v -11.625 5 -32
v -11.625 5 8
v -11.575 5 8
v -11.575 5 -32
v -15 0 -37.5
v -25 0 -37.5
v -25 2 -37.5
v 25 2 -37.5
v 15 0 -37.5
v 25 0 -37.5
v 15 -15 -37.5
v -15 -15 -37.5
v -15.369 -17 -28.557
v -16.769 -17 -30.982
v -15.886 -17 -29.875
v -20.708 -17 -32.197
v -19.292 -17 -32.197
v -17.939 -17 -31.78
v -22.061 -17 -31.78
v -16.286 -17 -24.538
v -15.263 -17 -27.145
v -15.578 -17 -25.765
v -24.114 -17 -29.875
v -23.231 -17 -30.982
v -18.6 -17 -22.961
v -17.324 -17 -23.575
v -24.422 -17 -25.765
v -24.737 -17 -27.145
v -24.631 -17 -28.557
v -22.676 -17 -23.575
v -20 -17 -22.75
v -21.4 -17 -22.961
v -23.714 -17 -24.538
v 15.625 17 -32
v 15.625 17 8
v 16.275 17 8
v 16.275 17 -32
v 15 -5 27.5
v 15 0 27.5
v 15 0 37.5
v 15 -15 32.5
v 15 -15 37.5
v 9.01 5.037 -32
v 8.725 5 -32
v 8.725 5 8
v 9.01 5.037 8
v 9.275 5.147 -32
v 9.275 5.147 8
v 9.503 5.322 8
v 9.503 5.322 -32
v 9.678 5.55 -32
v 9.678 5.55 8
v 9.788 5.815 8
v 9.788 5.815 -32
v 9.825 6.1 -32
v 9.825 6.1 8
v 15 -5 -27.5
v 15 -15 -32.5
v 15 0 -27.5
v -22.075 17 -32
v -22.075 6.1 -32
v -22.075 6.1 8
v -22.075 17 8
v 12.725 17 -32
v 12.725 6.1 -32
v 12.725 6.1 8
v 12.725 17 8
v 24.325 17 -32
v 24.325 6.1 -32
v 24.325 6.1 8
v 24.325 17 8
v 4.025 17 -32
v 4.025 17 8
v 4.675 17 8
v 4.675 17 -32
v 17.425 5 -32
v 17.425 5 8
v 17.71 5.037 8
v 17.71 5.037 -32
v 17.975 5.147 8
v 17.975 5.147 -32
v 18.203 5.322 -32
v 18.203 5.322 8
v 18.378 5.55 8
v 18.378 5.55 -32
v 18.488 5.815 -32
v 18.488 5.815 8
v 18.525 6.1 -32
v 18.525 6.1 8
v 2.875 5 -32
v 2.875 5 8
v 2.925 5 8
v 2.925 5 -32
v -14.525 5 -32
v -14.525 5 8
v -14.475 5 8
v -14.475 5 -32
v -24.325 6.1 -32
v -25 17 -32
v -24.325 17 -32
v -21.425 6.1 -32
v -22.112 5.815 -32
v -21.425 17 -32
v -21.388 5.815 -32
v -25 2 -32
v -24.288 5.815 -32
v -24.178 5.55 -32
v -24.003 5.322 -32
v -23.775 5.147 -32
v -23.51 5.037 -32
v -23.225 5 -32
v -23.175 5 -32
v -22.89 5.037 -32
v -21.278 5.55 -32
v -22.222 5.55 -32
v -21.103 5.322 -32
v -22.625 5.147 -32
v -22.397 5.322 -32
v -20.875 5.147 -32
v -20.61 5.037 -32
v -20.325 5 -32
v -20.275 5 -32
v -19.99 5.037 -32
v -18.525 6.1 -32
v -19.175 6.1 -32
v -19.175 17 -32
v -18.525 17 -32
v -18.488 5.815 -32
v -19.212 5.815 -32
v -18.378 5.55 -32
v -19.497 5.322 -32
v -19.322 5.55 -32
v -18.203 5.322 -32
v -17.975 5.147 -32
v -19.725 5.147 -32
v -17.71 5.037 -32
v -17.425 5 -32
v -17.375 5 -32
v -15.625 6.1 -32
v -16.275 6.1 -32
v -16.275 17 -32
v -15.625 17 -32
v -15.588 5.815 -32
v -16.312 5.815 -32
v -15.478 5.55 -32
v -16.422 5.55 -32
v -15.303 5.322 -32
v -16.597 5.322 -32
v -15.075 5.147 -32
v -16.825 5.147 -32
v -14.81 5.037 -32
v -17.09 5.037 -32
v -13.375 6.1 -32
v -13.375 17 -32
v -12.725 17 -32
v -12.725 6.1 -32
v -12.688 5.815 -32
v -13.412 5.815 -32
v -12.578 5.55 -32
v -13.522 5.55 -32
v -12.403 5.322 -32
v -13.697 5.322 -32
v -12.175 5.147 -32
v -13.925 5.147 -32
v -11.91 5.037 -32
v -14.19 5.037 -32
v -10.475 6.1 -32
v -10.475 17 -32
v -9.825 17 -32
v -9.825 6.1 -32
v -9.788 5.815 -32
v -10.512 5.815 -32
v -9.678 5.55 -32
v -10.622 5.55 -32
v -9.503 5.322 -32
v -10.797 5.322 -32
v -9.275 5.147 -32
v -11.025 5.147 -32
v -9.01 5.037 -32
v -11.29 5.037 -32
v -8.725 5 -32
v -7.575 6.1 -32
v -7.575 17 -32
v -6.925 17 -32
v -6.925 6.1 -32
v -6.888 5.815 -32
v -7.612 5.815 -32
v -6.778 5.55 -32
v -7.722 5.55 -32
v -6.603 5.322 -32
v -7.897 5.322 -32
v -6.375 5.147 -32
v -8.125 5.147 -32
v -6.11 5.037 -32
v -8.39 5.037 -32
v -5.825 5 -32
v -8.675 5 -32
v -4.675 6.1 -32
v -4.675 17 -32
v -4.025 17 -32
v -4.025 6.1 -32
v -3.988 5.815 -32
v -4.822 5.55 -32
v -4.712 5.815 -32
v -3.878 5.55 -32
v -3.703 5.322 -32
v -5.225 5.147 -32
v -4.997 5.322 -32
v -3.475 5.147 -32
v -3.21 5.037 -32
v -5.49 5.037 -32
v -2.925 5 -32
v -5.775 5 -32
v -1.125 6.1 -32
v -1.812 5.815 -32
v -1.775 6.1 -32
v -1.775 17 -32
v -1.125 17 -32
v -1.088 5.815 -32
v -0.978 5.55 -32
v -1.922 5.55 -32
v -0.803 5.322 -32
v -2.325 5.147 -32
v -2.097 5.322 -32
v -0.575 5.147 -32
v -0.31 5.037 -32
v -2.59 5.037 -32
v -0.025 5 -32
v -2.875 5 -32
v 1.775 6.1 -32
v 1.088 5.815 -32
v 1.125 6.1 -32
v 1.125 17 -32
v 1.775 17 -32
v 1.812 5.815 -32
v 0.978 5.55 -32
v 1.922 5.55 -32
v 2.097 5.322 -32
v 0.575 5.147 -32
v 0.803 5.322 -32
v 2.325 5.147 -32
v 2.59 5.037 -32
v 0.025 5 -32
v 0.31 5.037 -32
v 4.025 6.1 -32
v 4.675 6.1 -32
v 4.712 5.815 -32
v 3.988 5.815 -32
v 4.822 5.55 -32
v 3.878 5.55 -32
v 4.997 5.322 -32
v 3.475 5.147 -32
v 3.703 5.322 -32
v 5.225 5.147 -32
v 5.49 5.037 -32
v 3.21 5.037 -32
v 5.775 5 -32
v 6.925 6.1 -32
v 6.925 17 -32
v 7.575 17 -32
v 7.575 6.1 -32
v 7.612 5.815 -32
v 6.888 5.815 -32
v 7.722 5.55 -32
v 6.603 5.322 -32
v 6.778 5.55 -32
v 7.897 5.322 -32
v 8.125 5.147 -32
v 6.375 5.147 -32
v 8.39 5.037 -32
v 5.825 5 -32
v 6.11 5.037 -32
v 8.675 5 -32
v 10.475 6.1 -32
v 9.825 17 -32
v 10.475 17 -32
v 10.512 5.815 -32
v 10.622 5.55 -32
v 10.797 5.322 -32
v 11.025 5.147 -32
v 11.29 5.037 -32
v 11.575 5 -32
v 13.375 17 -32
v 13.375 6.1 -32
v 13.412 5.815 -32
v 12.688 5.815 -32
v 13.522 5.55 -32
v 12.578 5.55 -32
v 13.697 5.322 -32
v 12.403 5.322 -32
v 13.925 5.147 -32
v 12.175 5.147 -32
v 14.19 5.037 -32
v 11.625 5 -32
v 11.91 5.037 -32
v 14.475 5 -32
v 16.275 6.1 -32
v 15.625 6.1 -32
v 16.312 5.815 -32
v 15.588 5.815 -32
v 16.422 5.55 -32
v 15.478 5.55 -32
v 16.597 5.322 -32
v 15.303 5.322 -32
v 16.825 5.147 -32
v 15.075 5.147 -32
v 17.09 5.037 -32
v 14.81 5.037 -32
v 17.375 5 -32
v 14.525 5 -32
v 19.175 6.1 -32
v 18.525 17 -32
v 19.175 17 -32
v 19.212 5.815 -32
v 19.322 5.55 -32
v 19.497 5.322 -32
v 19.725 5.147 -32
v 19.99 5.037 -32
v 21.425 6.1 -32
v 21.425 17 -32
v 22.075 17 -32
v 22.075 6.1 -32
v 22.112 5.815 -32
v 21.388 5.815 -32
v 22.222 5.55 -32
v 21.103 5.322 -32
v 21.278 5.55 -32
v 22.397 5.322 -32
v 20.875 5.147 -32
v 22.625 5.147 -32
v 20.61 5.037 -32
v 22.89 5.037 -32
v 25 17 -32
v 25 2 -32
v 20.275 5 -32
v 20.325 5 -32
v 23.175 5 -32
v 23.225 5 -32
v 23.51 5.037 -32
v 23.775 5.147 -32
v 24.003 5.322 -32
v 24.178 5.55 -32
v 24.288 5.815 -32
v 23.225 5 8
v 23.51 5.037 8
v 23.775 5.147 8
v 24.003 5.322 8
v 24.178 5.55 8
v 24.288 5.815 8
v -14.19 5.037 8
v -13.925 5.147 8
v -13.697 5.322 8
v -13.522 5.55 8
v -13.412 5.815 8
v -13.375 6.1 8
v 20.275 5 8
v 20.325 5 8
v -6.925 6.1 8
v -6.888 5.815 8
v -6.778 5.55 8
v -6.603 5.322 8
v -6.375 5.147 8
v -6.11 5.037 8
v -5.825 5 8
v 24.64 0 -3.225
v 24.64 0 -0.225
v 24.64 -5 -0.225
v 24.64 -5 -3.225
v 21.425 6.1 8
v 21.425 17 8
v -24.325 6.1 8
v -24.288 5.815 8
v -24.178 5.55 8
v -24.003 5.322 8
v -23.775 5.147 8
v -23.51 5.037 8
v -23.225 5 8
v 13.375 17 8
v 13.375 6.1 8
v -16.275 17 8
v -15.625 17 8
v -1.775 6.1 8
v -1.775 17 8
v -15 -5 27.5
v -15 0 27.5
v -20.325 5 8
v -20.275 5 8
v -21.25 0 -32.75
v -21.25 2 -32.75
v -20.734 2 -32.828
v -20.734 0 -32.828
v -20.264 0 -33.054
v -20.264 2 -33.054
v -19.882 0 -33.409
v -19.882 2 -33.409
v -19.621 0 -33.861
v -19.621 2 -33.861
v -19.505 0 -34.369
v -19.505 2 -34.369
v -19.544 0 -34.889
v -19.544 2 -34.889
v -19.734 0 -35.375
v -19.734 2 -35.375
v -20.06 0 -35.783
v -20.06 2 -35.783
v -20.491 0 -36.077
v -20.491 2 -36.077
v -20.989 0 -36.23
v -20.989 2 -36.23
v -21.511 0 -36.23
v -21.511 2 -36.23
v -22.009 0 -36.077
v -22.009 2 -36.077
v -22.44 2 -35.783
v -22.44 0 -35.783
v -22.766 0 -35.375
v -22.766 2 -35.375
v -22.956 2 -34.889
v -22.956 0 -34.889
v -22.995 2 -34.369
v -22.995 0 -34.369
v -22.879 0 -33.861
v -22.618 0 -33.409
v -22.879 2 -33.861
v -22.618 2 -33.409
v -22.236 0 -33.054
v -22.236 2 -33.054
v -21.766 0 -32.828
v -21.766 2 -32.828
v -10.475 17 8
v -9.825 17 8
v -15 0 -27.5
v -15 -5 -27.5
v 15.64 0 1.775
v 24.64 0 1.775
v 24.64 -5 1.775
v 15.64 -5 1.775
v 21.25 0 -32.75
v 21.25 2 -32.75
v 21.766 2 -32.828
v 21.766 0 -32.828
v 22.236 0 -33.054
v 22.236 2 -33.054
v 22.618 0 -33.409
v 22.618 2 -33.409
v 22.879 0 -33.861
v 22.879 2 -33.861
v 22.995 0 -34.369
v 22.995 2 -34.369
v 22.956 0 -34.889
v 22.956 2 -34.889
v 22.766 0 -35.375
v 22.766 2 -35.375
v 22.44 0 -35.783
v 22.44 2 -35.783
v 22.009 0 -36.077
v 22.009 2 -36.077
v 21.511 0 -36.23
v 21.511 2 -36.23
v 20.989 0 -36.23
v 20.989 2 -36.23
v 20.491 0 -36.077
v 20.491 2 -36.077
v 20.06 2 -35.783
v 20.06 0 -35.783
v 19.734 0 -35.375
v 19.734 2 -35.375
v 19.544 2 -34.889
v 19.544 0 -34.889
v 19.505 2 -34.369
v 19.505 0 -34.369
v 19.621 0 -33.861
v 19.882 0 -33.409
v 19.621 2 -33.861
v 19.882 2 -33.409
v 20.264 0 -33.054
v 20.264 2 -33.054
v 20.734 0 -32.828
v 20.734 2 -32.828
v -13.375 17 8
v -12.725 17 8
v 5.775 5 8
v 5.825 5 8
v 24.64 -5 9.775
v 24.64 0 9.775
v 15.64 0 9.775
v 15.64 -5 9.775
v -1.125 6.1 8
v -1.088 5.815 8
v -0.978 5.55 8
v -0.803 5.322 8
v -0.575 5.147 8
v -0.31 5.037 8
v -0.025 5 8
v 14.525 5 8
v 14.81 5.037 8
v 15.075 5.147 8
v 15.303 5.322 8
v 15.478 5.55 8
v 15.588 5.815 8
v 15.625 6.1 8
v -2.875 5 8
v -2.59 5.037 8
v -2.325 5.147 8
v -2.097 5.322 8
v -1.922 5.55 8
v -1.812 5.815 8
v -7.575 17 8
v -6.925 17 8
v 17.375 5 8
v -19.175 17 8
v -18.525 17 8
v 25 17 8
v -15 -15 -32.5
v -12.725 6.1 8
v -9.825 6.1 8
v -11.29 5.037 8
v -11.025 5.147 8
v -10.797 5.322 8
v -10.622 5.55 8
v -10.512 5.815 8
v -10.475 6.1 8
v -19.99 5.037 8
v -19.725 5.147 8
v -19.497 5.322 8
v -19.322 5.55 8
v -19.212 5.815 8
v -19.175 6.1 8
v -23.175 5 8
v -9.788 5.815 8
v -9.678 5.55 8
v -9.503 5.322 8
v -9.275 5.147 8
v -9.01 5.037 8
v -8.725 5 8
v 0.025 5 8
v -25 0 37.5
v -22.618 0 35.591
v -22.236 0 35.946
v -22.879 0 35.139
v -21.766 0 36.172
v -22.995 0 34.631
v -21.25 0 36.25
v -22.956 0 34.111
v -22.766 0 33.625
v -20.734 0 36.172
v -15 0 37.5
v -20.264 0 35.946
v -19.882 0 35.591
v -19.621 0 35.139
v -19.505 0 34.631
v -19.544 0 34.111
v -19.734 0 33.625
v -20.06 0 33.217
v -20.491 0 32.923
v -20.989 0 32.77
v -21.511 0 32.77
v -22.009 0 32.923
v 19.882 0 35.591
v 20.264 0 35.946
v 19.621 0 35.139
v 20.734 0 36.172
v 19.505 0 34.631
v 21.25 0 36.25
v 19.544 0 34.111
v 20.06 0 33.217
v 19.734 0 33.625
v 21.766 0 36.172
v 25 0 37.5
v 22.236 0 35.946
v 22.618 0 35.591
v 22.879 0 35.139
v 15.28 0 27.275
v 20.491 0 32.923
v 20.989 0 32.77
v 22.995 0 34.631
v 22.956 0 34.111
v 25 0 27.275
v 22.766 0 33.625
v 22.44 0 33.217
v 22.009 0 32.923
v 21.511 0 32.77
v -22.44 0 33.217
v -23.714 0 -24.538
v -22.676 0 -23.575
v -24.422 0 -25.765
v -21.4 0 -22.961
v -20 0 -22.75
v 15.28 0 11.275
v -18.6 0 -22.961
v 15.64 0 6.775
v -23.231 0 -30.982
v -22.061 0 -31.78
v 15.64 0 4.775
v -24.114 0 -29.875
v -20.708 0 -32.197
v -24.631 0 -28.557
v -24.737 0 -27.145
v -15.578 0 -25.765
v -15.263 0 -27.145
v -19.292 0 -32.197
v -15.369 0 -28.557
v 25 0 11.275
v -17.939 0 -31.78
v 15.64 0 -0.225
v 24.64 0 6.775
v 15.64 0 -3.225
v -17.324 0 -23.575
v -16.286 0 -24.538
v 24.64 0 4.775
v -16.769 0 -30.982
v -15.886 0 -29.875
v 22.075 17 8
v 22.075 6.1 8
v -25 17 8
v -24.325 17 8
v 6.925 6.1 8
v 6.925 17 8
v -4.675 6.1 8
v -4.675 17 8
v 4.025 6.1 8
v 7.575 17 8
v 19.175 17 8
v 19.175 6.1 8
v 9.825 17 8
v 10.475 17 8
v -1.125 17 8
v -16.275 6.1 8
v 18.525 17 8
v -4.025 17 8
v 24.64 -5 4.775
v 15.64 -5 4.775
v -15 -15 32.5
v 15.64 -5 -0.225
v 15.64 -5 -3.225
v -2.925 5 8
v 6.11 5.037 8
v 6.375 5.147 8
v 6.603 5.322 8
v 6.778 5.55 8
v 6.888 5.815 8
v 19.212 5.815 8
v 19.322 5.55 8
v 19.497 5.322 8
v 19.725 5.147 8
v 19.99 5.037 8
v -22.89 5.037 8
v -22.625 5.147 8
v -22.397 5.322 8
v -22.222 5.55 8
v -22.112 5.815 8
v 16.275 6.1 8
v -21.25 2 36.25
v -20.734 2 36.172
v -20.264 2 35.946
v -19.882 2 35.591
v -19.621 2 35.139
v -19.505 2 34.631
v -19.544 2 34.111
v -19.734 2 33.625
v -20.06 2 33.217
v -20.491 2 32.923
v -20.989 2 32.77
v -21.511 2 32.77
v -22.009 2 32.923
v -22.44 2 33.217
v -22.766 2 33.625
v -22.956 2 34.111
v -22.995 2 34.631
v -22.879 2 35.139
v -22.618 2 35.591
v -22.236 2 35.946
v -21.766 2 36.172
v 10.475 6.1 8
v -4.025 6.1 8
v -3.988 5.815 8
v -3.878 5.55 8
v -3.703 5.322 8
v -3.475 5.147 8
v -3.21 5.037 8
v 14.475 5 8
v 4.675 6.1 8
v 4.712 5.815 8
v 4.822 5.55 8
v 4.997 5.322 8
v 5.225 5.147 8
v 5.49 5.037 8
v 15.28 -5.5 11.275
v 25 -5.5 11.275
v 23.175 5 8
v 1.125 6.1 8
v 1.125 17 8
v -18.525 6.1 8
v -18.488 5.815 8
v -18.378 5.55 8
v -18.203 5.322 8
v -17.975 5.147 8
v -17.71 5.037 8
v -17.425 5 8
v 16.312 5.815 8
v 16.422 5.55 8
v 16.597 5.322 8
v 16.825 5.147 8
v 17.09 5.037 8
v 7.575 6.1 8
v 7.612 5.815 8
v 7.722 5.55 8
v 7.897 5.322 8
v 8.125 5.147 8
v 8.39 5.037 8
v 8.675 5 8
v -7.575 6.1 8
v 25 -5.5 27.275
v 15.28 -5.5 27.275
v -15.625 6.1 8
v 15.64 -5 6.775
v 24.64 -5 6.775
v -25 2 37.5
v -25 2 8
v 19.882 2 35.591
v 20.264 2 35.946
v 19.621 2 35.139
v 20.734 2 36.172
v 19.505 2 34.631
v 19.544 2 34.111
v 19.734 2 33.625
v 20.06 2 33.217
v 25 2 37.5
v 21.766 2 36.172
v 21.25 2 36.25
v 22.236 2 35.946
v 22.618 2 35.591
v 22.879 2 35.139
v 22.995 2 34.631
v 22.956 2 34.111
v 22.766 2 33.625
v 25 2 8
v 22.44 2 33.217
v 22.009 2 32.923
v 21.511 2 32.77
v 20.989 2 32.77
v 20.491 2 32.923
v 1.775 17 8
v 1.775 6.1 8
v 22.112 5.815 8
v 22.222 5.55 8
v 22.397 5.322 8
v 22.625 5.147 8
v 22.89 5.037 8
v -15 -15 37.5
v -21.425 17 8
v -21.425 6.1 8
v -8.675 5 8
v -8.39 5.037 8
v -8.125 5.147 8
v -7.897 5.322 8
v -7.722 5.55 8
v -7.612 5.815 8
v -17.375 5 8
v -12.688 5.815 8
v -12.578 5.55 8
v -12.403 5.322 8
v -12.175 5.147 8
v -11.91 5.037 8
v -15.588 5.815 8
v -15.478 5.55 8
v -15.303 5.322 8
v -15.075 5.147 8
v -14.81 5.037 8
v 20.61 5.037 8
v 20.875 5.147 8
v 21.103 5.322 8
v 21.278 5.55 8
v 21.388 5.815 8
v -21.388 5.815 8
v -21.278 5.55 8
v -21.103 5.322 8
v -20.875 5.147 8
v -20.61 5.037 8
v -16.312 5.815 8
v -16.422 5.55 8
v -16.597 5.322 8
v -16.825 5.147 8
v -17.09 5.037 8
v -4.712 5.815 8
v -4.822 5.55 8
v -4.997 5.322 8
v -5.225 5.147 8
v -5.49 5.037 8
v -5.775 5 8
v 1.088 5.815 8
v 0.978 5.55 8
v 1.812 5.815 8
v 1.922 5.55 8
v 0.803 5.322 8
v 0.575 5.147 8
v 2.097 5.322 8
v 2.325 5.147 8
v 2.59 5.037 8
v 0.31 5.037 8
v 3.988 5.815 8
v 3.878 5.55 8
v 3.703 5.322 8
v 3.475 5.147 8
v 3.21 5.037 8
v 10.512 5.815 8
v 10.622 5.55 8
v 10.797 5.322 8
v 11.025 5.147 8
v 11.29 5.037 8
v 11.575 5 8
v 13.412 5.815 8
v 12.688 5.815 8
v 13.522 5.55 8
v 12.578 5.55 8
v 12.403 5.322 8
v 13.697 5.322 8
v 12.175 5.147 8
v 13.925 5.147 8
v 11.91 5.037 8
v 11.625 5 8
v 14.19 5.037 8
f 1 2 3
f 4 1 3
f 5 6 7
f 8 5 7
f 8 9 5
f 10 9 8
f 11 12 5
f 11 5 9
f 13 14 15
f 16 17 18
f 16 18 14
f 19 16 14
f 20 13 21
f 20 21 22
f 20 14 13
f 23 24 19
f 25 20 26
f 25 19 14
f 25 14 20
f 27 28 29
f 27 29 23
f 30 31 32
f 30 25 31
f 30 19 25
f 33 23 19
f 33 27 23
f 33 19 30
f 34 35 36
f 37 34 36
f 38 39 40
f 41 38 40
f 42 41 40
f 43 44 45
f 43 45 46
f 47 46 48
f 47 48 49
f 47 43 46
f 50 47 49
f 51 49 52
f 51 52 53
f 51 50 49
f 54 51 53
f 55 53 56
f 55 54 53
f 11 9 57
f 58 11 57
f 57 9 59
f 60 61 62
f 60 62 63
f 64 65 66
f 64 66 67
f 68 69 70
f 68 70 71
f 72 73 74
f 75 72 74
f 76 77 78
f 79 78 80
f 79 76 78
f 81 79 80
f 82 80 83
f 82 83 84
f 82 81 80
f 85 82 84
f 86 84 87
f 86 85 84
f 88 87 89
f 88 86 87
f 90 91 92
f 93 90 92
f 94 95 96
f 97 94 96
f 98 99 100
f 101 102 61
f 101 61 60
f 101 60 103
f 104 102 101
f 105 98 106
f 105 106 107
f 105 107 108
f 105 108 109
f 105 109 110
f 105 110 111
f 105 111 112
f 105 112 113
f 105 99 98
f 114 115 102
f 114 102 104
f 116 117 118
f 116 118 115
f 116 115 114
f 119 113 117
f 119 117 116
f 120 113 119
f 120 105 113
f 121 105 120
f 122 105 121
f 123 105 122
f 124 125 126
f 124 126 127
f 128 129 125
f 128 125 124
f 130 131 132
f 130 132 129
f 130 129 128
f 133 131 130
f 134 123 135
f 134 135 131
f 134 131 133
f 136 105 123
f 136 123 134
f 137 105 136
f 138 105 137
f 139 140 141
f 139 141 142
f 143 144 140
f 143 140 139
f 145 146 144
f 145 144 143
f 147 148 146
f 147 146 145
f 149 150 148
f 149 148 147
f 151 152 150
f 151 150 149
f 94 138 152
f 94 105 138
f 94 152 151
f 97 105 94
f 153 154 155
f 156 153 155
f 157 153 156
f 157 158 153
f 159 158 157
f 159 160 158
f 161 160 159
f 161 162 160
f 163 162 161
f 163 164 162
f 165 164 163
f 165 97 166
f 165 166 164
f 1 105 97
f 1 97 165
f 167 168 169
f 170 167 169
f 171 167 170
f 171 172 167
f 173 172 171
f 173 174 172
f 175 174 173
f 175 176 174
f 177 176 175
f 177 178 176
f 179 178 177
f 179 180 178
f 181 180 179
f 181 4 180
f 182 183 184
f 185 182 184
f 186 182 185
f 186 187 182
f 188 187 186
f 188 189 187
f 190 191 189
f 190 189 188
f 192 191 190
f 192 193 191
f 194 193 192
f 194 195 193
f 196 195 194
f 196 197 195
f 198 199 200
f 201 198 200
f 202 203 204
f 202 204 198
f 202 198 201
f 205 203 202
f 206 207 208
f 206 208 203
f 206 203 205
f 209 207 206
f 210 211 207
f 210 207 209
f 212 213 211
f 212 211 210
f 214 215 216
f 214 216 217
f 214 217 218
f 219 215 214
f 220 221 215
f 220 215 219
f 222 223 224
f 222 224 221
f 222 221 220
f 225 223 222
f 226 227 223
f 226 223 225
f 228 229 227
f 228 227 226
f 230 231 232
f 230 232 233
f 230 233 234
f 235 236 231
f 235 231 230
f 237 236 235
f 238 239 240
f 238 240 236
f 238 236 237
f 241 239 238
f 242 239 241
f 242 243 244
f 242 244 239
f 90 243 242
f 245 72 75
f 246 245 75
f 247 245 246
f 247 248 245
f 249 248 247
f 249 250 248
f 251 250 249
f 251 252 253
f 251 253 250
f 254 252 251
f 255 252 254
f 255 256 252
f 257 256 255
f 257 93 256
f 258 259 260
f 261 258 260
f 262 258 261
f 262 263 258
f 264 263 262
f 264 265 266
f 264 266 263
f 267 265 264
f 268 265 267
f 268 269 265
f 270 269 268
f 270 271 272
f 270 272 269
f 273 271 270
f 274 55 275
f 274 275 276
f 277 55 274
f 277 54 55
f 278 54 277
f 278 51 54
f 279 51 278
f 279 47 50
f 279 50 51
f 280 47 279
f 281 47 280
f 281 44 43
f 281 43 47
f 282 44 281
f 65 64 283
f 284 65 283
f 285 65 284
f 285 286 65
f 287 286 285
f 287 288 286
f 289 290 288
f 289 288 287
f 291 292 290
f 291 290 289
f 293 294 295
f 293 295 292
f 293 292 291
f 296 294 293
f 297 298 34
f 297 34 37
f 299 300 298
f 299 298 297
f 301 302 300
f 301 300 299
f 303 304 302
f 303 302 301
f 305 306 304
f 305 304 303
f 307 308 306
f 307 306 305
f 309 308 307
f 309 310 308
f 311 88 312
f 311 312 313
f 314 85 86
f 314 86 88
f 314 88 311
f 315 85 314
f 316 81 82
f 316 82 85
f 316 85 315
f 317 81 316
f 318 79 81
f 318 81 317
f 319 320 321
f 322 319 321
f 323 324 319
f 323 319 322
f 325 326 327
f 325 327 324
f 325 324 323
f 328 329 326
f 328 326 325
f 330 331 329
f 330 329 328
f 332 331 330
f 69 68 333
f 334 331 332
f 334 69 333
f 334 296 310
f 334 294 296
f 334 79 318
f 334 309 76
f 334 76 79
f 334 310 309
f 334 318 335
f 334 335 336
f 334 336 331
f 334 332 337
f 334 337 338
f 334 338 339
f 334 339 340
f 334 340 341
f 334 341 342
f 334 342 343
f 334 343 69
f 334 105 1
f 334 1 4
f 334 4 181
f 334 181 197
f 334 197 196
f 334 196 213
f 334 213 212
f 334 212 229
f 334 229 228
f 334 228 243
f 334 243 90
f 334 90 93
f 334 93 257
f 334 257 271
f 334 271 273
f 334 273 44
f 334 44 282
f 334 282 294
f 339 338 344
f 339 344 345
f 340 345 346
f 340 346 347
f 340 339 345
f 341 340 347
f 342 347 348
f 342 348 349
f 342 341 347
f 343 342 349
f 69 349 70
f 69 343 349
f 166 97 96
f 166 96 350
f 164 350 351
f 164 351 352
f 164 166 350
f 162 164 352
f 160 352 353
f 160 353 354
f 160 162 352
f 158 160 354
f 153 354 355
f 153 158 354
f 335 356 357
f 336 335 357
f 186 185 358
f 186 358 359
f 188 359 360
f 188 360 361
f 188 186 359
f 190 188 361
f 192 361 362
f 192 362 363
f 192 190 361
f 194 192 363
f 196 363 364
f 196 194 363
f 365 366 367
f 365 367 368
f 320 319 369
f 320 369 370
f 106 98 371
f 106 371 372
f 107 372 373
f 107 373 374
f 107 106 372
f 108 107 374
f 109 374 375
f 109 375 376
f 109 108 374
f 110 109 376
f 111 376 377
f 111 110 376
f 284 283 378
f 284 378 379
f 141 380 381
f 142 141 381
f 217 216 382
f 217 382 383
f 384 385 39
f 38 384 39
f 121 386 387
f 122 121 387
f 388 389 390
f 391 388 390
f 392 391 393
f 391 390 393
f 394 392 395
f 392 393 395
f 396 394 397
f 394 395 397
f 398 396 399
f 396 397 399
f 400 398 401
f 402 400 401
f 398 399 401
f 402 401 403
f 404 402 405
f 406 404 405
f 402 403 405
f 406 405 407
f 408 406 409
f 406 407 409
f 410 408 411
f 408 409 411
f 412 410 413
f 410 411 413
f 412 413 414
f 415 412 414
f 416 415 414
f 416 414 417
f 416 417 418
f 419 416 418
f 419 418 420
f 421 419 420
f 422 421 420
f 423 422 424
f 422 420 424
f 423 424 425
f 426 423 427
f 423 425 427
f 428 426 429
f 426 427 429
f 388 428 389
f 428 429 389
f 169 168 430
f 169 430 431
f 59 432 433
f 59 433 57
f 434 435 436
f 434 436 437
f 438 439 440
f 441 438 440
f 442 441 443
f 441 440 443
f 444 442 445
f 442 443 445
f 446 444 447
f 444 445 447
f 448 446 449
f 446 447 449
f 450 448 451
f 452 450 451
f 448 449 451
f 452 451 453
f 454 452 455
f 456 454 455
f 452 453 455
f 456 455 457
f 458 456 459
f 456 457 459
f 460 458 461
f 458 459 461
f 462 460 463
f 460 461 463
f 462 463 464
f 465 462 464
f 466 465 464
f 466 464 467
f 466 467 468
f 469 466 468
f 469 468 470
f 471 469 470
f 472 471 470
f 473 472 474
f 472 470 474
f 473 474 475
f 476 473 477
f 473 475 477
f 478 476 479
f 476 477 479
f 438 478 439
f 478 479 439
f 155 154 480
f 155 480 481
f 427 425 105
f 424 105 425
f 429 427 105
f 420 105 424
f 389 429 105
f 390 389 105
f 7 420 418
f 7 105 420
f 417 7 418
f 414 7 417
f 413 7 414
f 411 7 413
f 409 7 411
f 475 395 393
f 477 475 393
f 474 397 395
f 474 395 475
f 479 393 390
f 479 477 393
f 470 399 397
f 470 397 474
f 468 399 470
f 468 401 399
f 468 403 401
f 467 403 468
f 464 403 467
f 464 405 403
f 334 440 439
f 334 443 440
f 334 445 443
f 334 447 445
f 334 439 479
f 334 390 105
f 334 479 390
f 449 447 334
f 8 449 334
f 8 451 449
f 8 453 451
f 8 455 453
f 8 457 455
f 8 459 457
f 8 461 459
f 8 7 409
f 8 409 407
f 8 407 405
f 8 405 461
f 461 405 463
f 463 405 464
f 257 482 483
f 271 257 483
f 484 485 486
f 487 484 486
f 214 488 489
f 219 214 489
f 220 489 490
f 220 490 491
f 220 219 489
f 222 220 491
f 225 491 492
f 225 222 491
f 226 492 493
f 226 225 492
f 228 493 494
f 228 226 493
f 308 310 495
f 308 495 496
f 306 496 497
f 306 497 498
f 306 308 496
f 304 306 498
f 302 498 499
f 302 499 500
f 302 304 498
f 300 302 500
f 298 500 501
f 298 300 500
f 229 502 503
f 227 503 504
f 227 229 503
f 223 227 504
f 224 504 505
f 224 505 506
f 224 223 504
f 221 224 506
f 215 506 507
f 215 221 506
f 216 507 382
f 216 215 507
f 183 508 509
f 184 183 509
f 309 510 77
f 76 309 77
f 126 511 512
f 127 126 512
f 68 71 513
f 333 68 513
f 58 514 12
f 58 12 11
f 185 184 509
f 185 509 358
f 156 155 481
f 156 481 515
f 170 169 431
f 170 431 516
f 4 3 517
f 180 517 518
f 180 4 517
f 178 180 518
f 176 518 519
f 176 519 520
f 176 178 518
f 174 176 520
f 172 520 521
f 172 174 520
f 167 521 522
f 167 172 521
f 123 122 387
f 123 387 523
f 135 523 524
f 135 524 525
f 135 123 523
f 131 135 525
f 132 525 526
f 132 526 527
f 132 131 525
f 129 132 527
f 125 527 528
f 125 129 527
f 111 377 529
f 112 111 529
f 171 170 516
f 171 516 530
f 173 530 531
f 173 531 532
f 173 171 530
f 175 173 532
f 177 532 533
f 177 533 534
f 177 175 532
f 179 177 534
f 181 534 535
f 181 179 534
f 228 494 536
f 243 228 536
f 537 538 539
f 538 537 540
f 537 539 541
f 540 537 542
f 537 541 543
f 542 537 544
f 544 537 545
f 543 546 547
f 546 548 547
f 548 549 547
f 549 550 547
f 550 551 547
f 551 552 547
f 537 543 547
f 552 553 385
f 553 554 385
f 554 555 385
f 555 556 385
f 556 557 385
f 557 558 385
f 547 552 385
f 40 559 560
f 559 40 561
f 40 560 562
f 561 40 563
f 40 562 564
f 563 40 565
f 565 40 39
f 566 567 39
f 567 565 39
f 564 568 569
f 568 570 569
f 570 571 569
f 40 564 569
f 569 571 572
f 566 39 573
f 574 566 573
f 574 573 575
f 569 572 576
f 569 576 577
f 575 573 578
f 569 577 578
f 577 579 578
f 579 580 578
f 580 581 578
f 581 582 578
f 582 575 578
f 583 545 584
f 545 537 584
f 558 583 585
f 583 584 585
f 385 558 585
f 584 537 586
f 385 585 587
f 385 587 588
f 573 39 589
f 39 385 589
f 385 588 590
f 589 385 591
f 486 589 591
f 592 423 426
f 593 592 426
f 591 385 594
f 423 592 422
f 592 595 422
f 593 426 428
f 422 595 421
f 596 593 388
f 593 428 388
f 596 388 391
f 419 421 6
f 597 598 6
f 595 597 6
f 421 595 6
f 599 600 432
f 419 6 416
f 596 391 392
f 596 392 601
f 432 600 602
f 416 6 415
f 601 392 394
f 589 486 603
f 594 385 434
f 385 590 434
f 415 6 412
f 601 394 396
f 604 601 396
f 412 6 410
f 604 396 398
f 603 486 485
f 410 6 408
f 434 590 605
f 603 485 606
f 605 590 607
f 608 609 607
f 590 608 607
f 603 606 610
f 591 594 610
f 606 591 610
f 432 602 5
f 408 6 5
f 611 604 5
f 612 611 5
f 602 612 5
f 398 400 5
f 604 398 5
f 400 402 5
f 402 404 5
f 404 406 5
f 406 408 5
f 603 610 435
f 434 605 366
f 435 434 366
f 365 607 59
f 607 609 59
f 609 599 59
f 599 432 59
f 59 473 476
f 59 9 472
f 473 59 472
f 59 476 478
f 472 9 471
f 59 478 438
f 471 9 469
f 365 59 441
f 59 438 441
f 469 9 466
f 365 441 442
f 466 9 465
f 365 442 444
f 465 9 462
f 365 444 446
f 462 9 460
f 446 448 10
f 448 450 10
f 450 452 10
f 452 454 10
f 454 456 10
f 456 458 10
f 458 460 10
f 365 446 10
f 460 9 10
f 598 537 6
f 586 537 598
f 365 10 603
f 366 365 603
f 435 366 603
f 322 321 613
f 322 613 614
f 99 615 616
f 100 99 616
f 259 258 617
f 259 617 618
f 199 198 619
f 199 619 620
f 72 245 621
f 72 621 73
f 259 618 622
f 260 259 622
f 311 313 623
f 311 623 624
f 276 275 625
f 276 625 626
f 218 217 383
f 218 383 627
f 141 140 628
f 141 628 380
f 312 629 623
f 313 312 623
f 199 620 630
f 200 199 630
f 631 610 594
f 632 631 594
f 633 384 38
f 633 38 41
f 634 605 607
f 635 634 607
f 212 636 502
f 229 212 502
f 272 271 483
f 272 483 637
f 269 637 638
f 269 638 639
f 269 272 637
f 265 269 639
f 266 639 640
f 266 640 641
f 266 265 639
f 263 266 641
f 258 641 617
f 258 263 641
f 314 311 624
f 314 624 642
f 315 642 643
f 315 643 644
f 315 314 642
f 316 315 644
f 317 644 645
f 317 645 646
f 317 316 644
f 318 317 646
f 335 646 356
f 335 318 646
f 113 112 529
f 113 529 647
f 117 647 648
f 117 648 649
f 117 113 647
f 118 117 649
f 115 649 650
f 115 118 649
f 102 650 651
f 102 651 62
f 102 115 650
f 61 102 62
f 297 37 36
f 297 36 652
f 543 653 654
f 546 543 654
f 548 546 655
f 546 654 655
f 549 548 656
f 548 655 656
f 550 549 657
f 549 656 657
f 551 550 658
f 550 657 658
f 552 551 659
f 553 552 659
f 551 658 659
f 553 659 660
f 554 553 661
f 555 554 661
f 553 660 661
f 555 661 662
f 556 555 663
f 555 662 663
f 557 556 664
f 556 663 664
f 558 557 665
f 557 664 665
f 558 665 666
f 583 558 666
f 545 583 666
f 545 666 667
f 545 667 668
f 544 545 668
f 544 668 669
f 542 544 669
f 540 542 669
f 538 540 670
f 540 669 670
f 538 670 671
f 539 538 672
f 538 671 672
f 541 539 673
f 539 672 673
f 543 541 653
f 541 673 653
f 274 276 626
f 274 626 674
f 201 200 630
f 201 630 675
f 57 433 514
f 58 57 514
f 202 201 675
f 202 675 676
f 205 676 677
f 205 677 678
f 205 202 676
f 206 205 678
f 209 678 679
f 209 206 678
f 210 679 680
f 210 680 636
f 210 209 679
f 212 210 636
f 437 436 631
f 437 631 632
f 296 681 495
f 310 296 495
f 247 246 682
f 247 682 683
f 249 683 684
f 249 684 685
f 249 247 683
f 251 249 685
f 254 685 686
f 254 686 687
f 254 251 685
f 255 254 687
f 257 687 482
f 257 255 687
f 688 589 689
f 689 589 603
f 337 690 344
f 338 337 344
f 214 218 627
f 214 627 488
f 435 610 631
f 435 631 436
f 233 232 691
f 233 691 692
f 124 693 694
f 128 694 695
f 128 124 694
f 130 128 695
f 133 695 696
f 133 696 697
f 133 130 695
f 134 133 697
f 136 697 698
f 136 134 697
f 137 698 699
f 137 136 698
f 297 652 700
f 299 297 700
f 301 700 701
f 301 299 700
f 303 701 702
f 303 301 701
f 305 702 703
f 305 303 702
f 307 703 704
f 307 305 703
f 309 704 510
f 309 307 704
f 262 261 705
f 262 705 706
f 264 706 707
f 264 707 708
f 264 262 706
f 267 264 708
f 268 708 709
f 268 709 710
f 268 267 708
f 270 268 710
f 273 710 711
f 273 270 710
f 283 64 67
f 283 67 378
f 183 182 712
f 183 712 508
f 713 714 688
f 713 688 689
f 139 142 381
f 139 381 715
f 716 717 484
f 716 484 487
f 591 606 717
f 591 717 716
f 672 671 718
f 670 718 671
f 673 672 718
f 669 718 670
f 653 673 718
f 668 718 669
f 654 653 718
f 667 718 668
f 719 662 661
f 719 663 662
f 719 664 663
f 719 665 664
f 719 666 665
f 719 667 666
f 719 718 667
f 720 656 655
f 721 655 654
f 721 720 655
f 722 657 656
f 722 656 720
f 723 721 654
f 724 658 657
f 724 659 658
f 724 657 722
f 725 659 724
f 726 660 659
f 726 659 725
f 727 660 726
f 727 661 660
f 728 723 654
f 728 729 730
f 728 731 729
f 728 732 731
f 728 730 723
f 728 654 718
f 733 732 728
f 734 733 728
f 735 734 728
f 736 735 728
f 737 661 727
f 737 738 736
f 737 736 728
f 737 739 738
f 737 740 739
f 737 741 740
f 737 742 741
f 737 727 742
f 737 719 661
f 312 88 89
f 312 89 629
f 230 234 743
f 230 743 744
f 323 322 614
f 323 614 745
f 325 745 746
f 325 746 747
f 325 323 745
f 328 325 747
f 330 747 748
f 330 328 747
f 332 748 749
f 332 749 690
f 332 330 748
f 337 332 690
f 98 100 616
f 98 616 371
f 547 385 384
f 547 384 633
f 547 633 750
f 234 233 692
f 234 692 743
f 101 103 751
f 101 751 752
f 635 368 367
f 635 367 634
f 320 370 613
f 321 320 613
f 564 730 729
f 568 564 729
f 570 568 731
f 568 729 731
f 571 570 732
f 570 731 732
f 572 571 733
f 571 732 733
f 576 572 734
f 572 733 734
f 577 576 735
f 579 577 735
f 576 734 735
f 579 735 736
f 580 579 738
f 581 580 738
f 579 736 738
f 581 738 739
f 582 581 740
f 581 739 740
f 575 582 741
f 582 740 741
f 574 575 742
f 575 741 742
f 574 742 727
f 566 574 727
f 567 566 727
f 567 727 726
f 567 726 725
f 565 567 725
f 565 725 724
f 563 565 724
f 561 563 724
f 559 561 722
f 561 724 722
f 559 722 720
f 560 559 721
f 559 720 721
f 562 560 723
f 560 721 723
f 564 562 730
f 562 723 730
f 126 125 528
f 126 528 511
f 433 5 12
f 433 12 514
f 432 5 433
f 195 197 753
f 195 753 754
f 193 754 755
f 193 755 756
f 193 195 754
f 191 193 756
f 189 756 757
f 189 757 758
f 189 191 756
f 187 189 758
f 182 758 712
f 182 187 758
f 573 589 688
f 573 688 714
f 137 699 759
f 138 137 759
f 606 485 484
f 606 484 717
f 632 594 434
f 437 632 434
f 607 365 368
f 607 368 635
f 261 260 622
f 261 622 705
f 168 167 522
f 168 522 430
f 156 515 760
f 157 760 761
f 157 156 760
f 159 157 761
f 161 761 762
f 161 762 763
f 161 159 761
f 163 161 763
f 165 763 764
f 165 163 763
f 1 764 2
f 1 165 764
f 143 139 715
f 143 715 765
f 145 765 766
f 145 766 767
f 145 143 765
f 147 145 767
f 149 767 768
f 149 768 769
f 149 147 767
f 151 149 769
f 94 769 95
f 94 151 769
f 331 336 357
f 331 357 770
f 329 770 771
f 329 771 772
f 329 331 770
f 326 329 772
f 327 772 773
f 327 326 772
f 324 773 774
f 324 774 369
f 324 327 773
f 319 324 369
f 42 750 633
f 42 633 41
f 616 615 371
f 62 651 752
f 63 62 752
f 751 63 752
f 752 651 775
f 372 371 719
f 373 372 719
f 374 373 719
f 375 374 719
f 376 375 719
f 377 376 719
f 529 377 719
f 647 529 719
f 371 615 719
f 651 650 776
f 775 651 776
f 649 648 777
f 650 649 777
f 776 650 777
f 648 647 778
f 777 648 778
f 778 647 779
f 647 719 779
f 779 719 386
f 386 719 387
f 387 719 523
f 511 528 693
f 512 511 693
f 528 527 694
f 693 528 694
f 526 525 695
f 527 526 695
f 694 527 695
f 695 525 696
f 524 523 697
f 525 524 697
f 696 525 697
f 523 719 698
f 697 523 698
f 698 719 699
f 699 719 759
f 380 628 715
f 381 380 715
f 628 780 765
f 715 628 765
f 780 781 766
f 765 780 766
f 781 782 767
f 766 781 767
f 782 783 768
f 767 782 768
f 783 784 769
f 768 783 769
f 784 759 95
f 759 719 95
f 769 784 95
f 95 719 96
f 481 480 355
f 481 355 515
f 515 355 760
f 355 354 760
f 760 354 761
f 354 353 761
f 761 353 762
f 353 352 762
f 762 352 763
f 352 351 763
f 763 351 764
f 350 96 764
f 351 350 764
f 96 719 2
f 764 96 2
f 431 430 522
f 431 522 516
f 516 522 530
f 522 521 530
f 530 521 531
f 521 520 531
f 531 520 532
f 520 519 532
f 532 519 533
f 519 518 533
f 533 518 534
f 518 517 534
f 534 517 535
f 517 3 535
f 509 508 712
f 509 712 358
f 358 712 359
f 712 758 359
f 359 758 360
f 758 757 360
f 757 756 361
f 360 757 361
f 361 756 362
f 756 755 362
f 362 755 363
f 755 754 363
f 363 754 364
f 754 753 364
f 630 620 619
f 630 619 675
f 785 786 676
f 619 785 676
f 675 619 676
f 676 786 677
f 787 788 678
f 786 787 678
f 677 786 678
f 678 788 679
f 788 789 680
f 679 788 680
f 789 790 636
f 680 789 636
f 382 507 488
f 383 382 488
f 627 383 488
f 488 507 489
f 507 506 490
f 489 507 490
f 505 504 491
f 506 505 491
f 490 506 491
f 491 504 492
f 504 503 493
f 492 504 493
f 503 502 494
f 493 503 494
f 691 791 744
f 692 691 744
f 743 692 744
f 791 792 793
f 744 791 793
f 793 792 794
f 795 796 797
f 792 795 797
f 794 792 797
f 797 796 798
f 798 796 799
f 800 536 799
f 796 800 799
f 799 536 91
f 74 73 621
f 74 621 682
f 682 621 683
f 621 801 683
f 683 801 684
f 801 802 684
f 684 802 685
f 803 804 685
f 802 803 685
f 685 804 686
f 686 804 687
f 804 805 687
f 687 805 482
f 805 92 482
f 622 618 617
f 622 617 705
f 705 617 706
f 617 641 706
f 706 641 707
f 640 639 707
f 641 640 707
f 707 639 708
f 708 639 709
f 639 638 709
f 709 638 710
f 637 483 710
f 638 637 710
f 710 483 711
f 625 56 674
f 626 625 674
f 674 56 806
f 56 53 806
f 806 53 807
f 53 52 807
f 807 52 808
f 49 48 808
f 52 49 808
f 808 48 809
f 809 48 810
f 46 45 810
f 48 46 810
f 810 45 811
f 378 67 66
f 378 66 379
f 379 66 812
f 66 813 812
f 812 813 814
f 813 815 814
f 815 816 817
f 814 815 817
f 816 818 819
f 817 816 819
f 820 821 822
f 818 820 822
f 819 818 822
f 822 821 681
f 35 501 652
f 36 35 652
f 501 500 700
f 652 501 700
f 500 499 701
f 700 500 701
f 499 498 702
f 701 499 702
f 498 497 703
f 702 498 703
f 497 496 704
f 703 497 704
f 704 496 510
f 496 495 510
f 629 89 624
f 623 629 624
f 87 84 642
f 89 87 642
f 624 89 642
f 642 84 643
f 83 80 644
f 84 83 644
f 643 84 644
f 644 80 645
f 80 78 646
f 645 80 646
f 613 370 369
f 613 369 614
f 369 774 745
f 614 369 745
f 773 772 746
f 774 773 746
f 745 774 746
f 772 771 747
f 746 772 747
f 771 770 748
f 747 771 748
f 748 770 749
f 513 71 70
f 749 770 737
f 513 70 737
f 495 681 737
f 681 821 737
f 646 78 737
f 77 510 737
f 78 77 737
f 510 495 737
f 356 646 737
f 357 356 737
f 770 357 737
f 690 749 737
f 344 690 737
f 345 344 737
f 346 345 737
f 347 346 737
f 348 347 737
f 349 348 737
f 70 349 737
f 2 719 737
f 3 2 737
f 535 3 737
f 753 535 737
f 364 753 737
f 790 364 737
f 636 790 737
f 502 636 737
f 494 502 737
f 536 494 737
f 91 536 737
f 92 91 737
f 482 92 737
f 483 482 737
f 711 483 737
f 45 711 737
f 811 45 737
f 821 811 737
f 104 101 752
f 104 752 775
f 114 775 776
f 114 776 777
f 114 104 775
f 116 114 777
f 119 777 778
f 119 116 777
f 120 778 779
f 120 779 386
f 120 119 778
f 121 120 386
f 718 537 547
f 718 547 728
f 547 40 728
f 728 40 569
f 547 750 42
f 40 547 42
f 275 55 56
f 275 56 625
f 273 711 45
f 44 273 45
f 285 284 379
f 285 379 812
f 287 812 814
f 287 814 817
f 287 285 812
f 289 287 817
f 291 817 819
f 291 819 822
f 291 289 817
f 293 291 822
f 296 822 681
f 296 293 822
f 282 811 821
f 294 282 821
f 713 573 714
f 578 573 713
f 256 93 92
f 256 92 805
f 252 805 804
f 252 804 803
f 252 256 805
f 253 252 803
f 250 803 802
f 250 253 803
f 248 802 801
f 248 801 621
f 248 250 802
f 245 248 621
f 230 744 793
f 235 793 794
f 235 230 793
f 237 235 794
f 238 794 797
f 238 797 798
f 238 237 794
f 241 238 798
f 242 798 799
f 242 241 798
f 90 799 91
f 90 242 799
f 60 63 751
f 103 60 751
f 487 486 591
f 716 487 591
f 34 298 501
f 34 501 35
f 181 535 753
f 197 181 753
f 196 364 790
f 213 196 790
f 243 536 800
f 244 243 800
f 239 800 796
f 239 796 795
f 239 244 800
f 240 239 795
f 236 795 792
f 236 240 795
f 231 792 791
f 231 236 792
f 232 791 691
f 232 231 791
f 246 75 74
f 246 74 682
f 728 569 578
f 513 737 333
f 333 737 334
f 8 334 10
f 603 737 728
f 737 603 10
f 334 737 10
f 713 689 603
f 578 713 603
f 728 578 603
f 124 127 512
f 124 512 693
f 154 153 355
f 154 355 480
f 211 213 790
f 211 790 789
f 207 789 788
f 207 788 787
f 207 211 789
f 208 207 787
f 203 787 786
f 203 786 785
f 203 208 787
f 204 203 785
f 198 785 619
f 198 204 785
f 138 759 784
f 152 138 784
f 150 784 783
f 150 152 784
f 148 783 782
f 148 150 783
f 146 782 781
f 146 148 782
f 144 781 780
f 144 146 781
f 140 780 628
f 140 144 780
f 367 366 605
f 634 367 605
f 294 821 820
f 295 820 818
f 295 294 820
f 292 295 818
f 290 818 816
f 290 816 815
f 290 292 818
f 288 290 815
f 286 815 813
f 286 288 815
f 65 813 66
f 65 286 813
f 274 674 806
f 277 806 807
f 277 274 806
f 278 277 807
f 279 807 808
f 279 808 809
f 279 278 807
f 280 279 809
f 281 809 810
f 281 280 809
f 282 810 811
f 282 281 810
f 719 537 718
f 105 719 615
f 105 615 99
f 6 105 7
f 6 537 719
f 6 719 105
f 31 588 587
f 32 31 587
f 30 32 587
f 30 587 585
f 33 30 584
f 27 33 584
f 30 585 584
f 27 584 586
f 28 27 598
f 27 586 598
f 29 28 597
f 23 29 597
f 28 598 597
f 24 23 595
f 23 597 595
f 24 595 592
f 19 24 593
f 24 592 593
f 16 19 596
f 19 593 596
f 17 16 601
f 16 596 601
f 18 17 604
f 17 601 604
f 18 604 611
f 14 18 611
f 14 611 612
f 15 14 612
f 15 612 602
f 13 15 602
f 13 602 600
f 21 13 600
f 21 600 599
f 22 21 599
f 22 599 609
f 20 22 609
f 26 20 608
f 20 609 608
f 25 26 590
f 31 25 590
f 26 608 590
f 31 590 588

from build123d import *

# Parameters (mm, degrees)
SKETCH1_W            = 50
SKETCH1_H            = 75
BOSS_EXTRUDE1_DEPTH  = 2
SKETCH2_W            = 50
SKETCH2_H            = 40
BOSS_EXTRUDE2_DEPTH  = 15
CUT_EXTRUDE1_DEPTH   = 40
SKETCH4_W            = 30
SKETCH4_H            = 10
BOSS_EXTRUDE3_DEPTH  = 15
CUT_EXTRUDE2_DEPTH   = 30
SKETCH6_R            = 4.75
BOSS_EXTRUDE6_DEPTH  = 17
SKETCH7_W            = 9.72
SKETCH7_H            = 16
BOSS_EXTRUDE9_DEPTH  = 5.5
SKETCH8_W            = 9
SKETCH8_H            = 3
BOSS_EXTRUDE10_DEPTH = 5
SKETCH9_R            = 1.75
CUT_EXTRUDE4_DEPTH   = 2


with BuildPart() as part:
    # Sketch1 → Boss-Extrude1 (new body)
    with BuildSketch(Plane(origin=(0, 0, 0), x_dir=(1, 0, 0), z_dir=(0, 1, 0))):
        Rectangle(SKETCH1_W, SKETCH1_H)
    extrude(amount=BOSS_EXTRUDE1_DEPTH)

    # Sketch2 → Boss-Extrude2 (add)
    with BuildSketch(Plane(origin=(0, 2, 0), x_dir=(1, 0, 0), z_dir=(0, 1, 0))):
        with Locations((0, 12)):
            Rectangle(SKETCH2_W, SKETCH2_H)
    extrude(amount=BOSS_EXTRUDE2_DEPTH)

    # Sketch3 → Cut-Extrude1 (cut)
    with BuildSketch(Plane(origin=(0, 0, -32), x_dir=(-1, 0, 0), z_dir=(0, 0, -1))):
        with BuildLine():
            Line((4.025, 25), (4.025, 6.1))
            ThreePointArc((4.025, 6.1), (3.702817459, 5.322182541), (2.925, 5))
            Line((2.925, 5), (2.875, 5))
            ThreePointArc((2.875, 5), (2.097182541, 5.322182541), (1.775, 6.1))
            Line((1.775, 6.1), (1.775, 25))
            Line((1.775, 25), (4.025, 25))
        make_face()
        with BuildLine():
            Line((-1.125, 25), (1.125, 25))
            Line((1.125, 25), (1.125, 6.1))
            ThreePointArc((1.125, 6.1), (0.802817459, 5.322182541), (0.025, 5))
            Line((0.025, 5), (-0.025, 5))
            ThreePointArc((-0.025, 5), (-0.802817459, 5.322182541), (-1.125, 6.1))
            Line((-1.125, 6.1), (-1.125, 25))
        make_face()
        with BuildLine():
            Line((6.925, 25), (6.925, 6.1))
            ThreePointArc((6.925, 6.1), (6.602817459, 5.322182541), (5.825, 5))
            Line((5.825, 5), (5.775, 5))
            ThreePointArc((5.775, 5), (4.997182541, 5.322182541), (4.675, 6.1))
            Line((4.675, 6.1), (4.675, 25))
            Line((4.675, 25), (6.925, 25))
        make_face()
        with BuildLine():
            Line((9.825, 25), (9.825, 6.1))
            ThreePointArc((9.825, 6.1), (9.502817459, 5.322182541), (8.725, 5))
            Line((8.725, 5), (8.675, 5))
            ThreePointArc((8.675, 5), (7.897182541, 5.322182541), (7.575, 6.1))
            Line((7.575, 6.1), (7.575, 25))
            Line((7.575, 25), (9.825, 25))
        make_face()
        with BuildLine():
            Line((12.725, 25), (12.725, 6.1))
            ThreePointArc((12.725, 6.1), (12.402817459, 5.322182541), (11.625, 5))
            Line((11.625, 5), (11.575, 5))
            ThreePointArc((11.575, 5), (10.797182541, 5.322182541), (10.475, 6.1))
            Line((10.475, 6.1), (10.475, 25))
            Line((10.475, 25), (12.725, 25))
        make_face()
        with BuildLine():
            Line((15.625, 25), (15.625, 6.1))
            ThreePointArc((15.625, 6.1), (15.302817459, 5.322182541), (14.525, 5))
            Line((14.525, 5), (14.475, 5))
            ThreePointArc((14.475, 5), (13.697182541, 5.322182541), (13.375, 6.1))
            Line((13.375, 6.1), (13.375, 25))
            Line((13.375, 25), (15.625, 25))
        make_face()
        with BuildLine():
            Line((18.525, 25), (18.525, 6.1))
            ThreePointArc((18.525, 6.1), (18.202817459, 5.322182541), (17.425, 5))
            Line((17.425, 5), (17.375, 5))
            ThreePointArc((17.375, 5), (16.597182541, 5.322182541), (16.275, 6.1))
            Line((16.275, 6.1), (16.275, 25))
            Line((16.275, 25), (18.525, 25))
        make_face()
        with BuildLine():
            Line((21.425, 25), (21.425, 6.1))
            ThreePointArc((21.425, 6.1), (21.102817459, 5.322182541), (20.325, 5))
            Line((20.325, 5), (20.275, 5))
            ThreePointArc((20.275, 5), (19.497182541, 5.322182541), (19.175, 6.1))
            Line((19.175, 6.1), (19.175, 25))
            Line((19.175, 25), (21.425, 25))
        make_face()
        with BuildLine():
            Line((24.325, 25), (24.325, 6.1))
            ThreePointArc((24.325, 6.1), (24.002817459, 5.322182541), (23.225, 5))
            Line((23.225, 5), (23.175, 5))
            ThreePointArc((23.175, 5), (22.397182541, 5.322182541), (22.075, 6.1))
            Line((22.075, 6.1), (22.075, 25))
            Line((22.075, 25), (24.325, 25))
        make_face()
        with BuildLine():
            Line((-1.775, 25), (-1.775, 6.1))
            ThreePointArc((-1.775, 6.1), (-2.097182541, 5.322182541), (-2.875, 5))
            Line((-2.875, 5), (-2.925, 5))
            ThreePointArc((-2.925, 5), (-3.702817459, 5.322182541), (-4.025, 6.1))
            Line((-4.025, 6.1), (-4.025, 25))
            Line((-4.025, 25), (-1.775, 25))
        make_face()
        with BuildLine():
            Line((-4.675, 25), (-4.675, 6.1))
            ThreePointArc((-4.675, 6.1), (-4.997182541, 5.322182541), (-5.775, 5))
            Line((-5.775, 5), (-5.825, 5))
            ThreePointArc((-5.825, 5), (-6.602817459, 5.322182541), (-6.925, 6.1))
            Line((-6.925, 6.1), (-6.925, 25))
            Line((-6.925, 25), (-4.675, 25))
        make_face()
        with BuildLine():
            Line((-7.575, 25), (-7.575, 6.1))
            ThreePointArc((-7.575, 6.1), (-7.897182541, 5.322182541), (-8.675, 5))
            Line((-8.675, 5), (-8.725, 5))
            ThreePointArc((-8.725, 5), (-9.502817459, 5.322182541), (-9.825, 6.1))
            Line((-9.825, 6.1), (-9.825, 25))
            Line((-9.825, 25), (-7.575, 25))
        make_face()
        with BuildLine():
            Line((-10.475, 25), (-10.475, 6.1))
            ThreePointArc((-10.475, 6.1), (-10.797182541, 5.322182541), (-11.575, 5))
            Line((-11.575, 5), (-11.625, 5))
            ThreePointArc((-11.625, 5), (-12.402817459, 5.322182541), (-12.725, 6.1))
            Line((-12.725, 6.1), (-12.725, 25))
            Line((-12.725, 25), (-10.475, 25))
        make_face()
        with BuildLine():
            Line((-13.375, 25), (-13.375, 6.1))
            ThreePointArc((-13.375, 6.1), (-13.697182541, 5.322182541), (-14.475, 5))
            Line((-14.475, 5), (-14.525, 5))
            ThreePointArc((-14.525, 5), (-15.302817459, 5.322182541), (-15.625, 6.1))
            Line((-15.625, 6.1), (-15.625, 25))
            Line((-15.625, 25), (-13.375, 25))
        make_face()
        with BuildLine():
            Line((-16.275, 25), (-16.275, 6.1))
            ThreePointArc((-16.275, 6.1), (-16.597182541, 5.322182541), (-17.375, 5))
            Line((-17.375, 5), (-17.425, 5))
            ThreePointArc((-17.425, 5), (-18.202817459, 5.322182541), (-18.525, 6.1))
            Line((-18.525, 6.1), (-18.525, 25))
            Line((-18.525, 25), (-16.275, 25))
        make_face()
        with BuildLine():
            Line((-19.175, 25), (-19.175, 6.1))
            ThreePointArc((-19.175, 6.1), (-19.497182541, 5.322182541), (-20.275, 5))
            Line((-20.275, 5), (-20.325, 5))
            ThreePointArc((-20.325, 5), (-21.102817459, 5.322182541), (-21.425, 6.1))
            Line((-21.425, 6.1), (-21.425, 25))
            Line((-21.425, 25), (-19.175, 25))
        make_face()
        with BuildLine():
            Line((-22.075, 25), (-22.075, 6.1))
            ThreePointArc((-22.075, 6.1), (-22.397182541, 5.322182541), (-23.175, 5))
            Line((-23.175, 5), (-23.225, 5))
            ThreePointArc((-23.225, 5), (-24.002817459, 5.322182541), (-24.325, 6.1))
            Line((-24.325, 6.1), (-24.325, 25))
            Line((-24.325, 25), (-22.075, 25))
        make_face()
    extrude(amount=-CUT_EXTRUDE1_DEPTH, mode=Mode.SUBTRACT)

    # Sketch4 → Boss-Extrude3 (add)
    with BuildSketch(Plane.XZ):
        with Locations((0, 32.5)):
            Rectangle(SKETCH4_W, SKETCH4_H)
        with Locations((0, -32.5)):
            Rectangle(SKETCH4_W, SKETCH4_H)
    extrude(amount=BOSS_EXTRUDE3_DEPTH)

    # Sketch5 → Cut-Extrude2 (cut)
    with BuildSketch(Plane.ZY.offset(15)):
        Polygon((-27.5, -15), (-27.5, -5), (-32.5, -15), align=None)
        Polygon((32.5, -15), (27.5, -15), (27.5, -5), align=None)
    extrude(amount=-CUT_EXTRUDE2_DEPTH, mode=Mode.SUBTRACT)

    # Sketch6 → Boss-Extrude6 (add)
    with BuildSketch(Plane.XZ):
        with Locations(Location((-20, -27.5, 0), (0, 0, 90))):
            Circle(SKETCH6_R)
    extrude(amount=BOSS_EXTRUDE6_DEPTH)

    # Sketch7 → Boss-Extrude9 (add)
    with BuildSketch(Plane.XZ):
        with Locations((20.14, 19.274770973)):
            Rectangle(SKETCH7_W, SKETCH7_H)
    extrude(amount=BOSS_EXTRUDE9_DEPTH)

    # Sketch8 → Boss-Extrude10 (add)
    with BuildSketch(Plane(origin=(0, 0, 0), x_dir=(-1, 0, 0), z_dir=(0, -1, 0))):
        with Locations((-20.14, -3.274770973)):
            Rectangle(SKETCH8_W, SKETCH8_H)
        with Locations((-20.14, -8.274770973)):
            Rectangle(SKETCH8_W, SKETCH8_H)
        with Locations((-20.14, 1.725229027)):
            Rectangle(SKETCH8_W, SKETCH8_H)
    extrude(amount=BOSS_EXTRUDE10_DEPTH)

    # Sketch9 → Cut-Extrude4 (cut)
    with BuildSketch(Plane(origin=(0, 2, 0), x_dir=(1, 0, 0), z_dir=(0, 1, 0))):
        with Locations(Location((-21.25, 34.5, 0), (0, 0, 270))):
            Circle(SKETCH9_R)
        with Locations(Location((21.25, 34.5, 0), (0, 0, 270))):
            Circle(SKETCH9_R)
        with Locations(Location((-21.25, -34.5, 0), (0, 0, 270))):
            Circle(SKETCH9_R)
        with Locations(Location((21.25, -34.5, 0), (0, 0, 270))):
            Circle(SKETCH9_R)
    extrude(amount=-CUT_EXTRUDE4_DEPTH, mode=Mode.SUBTRACT)


solid = part.part
